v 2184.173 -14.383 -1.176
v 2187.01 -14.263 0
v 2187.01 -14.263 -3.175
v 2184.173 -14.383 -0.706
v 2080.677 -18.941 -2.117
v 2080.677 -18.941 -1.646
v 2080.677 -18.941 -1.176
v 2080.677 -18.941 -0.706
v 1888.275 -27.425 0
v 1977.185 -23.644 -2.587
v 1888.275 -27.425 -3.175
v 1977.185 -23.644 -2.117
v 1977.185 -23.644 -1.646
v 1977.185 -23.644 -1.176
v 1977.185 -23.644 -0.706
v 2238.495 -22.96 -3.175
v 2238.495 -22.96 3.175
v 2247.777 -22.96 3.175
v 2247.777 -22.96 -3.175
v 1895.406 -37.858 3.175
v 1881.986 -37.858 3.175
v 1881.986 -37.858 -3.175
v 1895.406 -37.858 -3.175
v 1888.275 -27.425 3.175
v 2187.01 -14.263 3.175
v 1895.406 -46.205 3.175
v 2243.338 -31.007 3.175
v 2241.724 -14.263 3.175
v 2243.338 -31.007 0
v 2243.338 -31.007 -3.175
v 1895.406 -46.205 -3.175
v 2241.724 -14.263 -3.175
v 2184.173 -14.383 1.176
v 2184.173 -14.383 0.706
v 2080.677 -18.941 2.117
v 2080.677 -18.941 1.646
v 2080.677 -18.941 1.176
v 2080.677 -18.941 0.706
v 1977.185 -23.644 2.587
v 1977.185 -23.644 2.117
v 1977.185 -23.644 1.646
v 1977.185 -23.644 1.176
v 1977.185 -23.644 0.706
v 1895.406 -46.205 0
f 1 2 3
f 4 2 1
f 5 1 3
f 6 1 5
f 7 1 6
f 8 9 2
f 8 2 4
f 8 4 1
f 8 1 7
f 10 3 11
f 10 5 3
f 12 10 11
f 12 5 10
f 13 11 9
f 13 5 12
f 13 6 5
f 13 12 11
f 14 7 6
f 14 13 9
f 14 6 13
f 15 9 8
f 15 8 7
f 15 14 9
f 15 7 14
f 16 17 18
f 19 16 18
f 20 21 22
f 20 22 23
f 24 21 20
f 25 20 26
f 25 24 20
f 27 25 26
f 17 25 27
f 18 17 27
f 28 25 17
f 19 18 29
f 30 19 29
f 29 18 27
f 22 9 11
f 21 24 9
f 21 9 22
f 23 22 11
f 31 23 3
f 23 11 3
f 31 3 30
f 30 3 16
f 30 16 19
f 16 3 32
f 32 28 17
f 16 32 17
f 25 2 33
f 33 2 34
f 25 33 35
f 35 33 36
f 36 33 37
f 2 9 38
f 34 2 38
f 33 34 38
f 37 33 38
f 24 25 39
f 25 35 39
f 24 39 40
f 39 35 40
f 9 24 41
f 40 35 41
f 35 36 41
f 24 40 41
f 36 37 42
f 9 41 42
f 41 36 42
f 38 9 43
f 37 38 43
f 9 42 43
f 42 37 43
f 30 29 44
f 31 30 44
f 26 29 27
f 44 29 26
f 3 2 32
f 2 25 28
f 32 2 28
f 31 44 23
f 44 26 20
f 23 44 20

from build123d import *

# Parameters (mm, degrees)
BOSS_EXTRUDE1_DEPTH = 3.175
CUT_EXTRUDE1_DEPTH  = 7.3500001
FILLET1_R           = 2.54
CUT_EXTRUDE2_DEPTH  = 7.62


with BuildPart() as part:
    # Sketch1 → Boss-Extrude1 (new body, symmetric)
    with BuildSketch(Plane.XY):
        with BuildLine():
            Line((499.61002795, -53.470702797), (1046.28548189, -53.470702797))
            add(Edge.make_bspline(
                [(2669.54, -9.569049356), (2615.393603553, -13.17073937), (2561.080658619, -16.536108081), (2506.205230446, -19.758621957), (2430.209106802, -23.505211705), (2354.212983157, -26.631486423), (2332.570330468, -27.480988169), (2156.268639429, -34.377768543), (1979.966947376, -41.628631248), (1824.114277635, -52.771265877), (1636.928606778, -53.579569849), (1449.742935921, -53.454024613), (1418.006730935, -53.470702797), (1324.899336146, -53.470702797), (1231.791940344, -53.470702797), (1170.441269319, -53.470702797), (1108.784075813, -53.470702797), (1047.126882346, -53.470702797), (1046.846414188, -53.470702797), (1046.565947184, -53.470702797), (1046.28548189, -53.470702797)],
                knots=[103.698913506, 103.698913506, 103.698913506, 103.698913506, 103.698913506, 103.698913506, 130.927896619, 130.927896619, 130.927896619, 141.337054719, 141.337054719, 141.337054719, 218.101815019, 218.101815019, 218.101815019, 233.772059419, 233.772059419, 233.772059419, 264.077723219, 264.077723219, 264.077723219, 264.2162088, 264.2162088, 264.2162088, 264.2162088, 264.2162088, 264.2162088], degree=5))
            Line((2669.54, -9.569049356), (2669.54, 9.5231025))
            add(Edge.make_bspline(
                [(2669.54, 9.5231025), (2667.126494524, 9.36235515), (2659.861586685, 8.880281494), (2635.666282302, 7.292469146), (2596.857665529, 4.826056853), (2545.729743039, 1.758344093), (2494.405305707, -1.098555235), (2451.533022267, -3.266573297), (2417.198316756, -4.86708361), (2391.457076919, -6.003589235), (2365.634736307, -7.086854581), (2339.546284672, -8.137729944), (2313.466132974, -9.165138371), (2287.612375486, -10.179478215), (2261.763347437, -11.201032297), (2227.285329715, -12.583842557), (2184.175569393, -14.36607236), (2132.429066114, -16.607427868), (2063.4255234, -19.708920485), (1977.174907635, -23.700543313), (1873.732451432, -28.149389221), (1770.37461881, -31.657468649), (1667.085687813, -33.793117556), (1581.011094491, -34.383188831), (1512.07397126, -34.4278026), (1443.061513477, -34.409510402), (1356.800927879, -34.424432812), (1218.794626954, -34.418464788), (1115.289022786, -34.420702797), (1046.28548189, -34.420702797)],
                knots=[103.571582669, 103.571582669, 103.571582669, 103.571582669, 104.300777207, 105.766098403, 110.877392287, 115.98868617, 121.099980054, 126.211273938, 128.76692088, 131.322567822, 133.878214764, 136.433861706, 138.989508647, 141.545155589, 144.100802531, 146.656449473, 151.767743357, 156.879037241, 161.990331124, 172.212918892, 182.43550666, 192.658094427, 202.880682195, 213.103269962, 218.214563846, 223.32585773, 233.548445497, 243.771033265, 264.2162088, 264.2162088, 264.2162088, 264.2162088], degree=3))
            Line((1046.28548189, -34.420702797), (499.61002795, -34.420702797))
            add(Edge.make_bspline(
                [(499.61002795, -34.420702797), (488.614737518, -34.420702797), (472.236395365, -34.420702798), (449.940231846, -34.420702794), (427.771305695, -34.42070281), (405.874681663, -34.420702712), (384.584909128, -34.420702942), (368.900229326, -34.420702244), (353.376568613, -34.420704862), (332.608466435, -34.420689186), (306.287754853, -34.420570006), (274.023487704, -34.420538256), (252.271015965, -34.420709741), (241.425150134, -34.420702761)],
                knots=[19.90682951, 19.90682951, 19.90682951, 19.90682951, 23.220120017, 24.876765271, 26.533410525, 29.846701033, 31.503346286, 33.15999154, 34.816636794, 36.473282048, 39.786572556, 43.099863063, 46.413153571, 46.413153571, 46.413153571, 46.413153571], degree=3))
            add(Edge.make_bspline(
                [(241.425150134, -34.420702761), (239.394928853, -34.420701455), (235.322322927, -34.420495867), (227.274423443, -34.398702533), (217.319360062, -34.297466855), (205.530690077, -33.976385563), (189.963341914, -33.212641271), (170.696984653, -31.543495194), (147.533261232, -28.314398128), (125.482753206, -24.202109872), (109.358914834, -20.622537553), (100.964116069, -18.612521054), (99.06, -18.149327722)],
                knots=[0, 0, 0, 0, 0.622088422, 1.244176844, 2.488353689, 3.732530533, 4.976707377, 7.465061066, 9.953414755, 12.441768444, 14.55823542, 15.180323842, 15.180323842, 15.180323842, 15.180323842], degree=3))
            Line((99.06, -18.149327722), (99.06, -37.741485304))
            add(Edge.make_bspline(
                [(241.425137875, -53.470702761), (224.286916993, -53.470691732), (207.149474967, -53.467315374), (190.203897513, -52.686577078), (161.734965878, -49.987457476), (133.266034188, -45.175583375), (121.749620566, -42.910592695), (110.349390726, -40.420274627), (99.06, -37.741485304)],
                knots=[0, 0, 0, 0, 0, 0, 8.71381608, 8.71381608, 8.71381608, 14.701907176, 14.701907176, 14.701907176, 14.701907176, 14.701907176, 14.701907176], degree=5))
            add(Edge.make_bspline(
                [(499.61002795, -53.470702797), (492.136820835, -53.470702797), (484.754348064, -53.470702797), (477.443025859, -53.470702797), (448.516583145, -53.470702797), (419.590140517, -53.470702797), (398.368118521, -53.470702797), (355.647540186, -53.470702797), (312.926961851, -53.470702797), (289.235090436, -53.470293029), (265.364963651, -53.470705034), (241.4948369, -53.470702789), (241.471603891, -53.470702785), (241.448370882, -53.470702776), (241.425137875, -53.470702761)],
                knots=[19.90682951, 19.90682951, 19.90682951, 19.90682951, 19.90682951, 19.90682951, 23.637897311, 23.637897311, 23.637897311, 34.276545571, 34.276545571, 34.276545571, 46.401340901, 46.401340901, 46.401340901, 46.413153571, 46.413153571, 46.413153571, 46.413153571, 46.413153571, 46.413153571], degree=5))
        make_face()
    extrude(amount=BOSS_EXTRUDE1_DEPTH, both=True)

    # Sketch2 → Cut-Extrude1 (cut, through all)
    with BuildSketch(Plane.XY.offset(3.175)):
        with BuildLine():
            add(Edge.make_bspline(
                [(2312.9875, -9.183260037), (2304.505441691, -9.516700376), (2287.441020622, -10.186250162), (2261.763347437, -11.201032297), (2228.230552004, -12.545932515), (2203.310445107, -13.575047161), (2187.00995947, -14.263260037)],
                knots=[139.04033329, 139.04033329, 139.04033329, 139.04033329, 141.545155589, 144.100802531, 146.656449473, 151.487488909, 151.487488909, 151.487488909, 151.487488909], degree=3))
            Line((2187.00995947, -14.263260037), (2312.9875, -14.263260037))
            Line((2312.9875, -14.263260037), (2312.9875, -9.183260037))
        make_face()
    extrude(amount=-CUT_EXTRUDE1_DEPTH, mode=Mode.SUBTRACT)

    # Fillet1
    fillet1_edges = [part.edges().sort_by_distance(p)[0] for p in [
        (2669.54, -9.569049356, -1.5875),
        (2669.54, 9.5231025, -1.5875),
        (99.06, -37.741485304, -1.5875),
        (99.06, -18.149327722, -1.5875),
        (2312.9875, -9.183260037, 1.5875),
        (2312.9875, -14.263260037, 0),
    ]]
    fillet(fillet1_edges, radius=FILLET1_R)

    # Sketch3 → Cut-Extrude2 (cut)
    with BuildSketch(Plane.XY.offset(3.175)):
        Polygon((1888.274985361, -27.424617015), (1881.98614013, -37.858137115), (1895.406326502, -37.858137115), (1895.406326502, -46.204944132), (1895.406326502, -50.216890409), (-62.255721057, -449.759899711), (-121.19134177, 139.596307418), (1888.274985361, -1.80721617), align=None)
        Polygon((2241.72424439, -14.263260032), (2238.495432608, -22.960040401), (2247.777444945, -22.960040401), (2243.337690155, -31.006850231), (2243.337690155, -37.858137115), (2717.854896536, -90.640248849), (2717.854896536, 35.478991246), (2241.72424439, 2.049936484), align=None)
    extrude(amount=-CUT_EXTRUDE2_DEPTH, mode=Mode.SUBTRACT)


solid = part.part
